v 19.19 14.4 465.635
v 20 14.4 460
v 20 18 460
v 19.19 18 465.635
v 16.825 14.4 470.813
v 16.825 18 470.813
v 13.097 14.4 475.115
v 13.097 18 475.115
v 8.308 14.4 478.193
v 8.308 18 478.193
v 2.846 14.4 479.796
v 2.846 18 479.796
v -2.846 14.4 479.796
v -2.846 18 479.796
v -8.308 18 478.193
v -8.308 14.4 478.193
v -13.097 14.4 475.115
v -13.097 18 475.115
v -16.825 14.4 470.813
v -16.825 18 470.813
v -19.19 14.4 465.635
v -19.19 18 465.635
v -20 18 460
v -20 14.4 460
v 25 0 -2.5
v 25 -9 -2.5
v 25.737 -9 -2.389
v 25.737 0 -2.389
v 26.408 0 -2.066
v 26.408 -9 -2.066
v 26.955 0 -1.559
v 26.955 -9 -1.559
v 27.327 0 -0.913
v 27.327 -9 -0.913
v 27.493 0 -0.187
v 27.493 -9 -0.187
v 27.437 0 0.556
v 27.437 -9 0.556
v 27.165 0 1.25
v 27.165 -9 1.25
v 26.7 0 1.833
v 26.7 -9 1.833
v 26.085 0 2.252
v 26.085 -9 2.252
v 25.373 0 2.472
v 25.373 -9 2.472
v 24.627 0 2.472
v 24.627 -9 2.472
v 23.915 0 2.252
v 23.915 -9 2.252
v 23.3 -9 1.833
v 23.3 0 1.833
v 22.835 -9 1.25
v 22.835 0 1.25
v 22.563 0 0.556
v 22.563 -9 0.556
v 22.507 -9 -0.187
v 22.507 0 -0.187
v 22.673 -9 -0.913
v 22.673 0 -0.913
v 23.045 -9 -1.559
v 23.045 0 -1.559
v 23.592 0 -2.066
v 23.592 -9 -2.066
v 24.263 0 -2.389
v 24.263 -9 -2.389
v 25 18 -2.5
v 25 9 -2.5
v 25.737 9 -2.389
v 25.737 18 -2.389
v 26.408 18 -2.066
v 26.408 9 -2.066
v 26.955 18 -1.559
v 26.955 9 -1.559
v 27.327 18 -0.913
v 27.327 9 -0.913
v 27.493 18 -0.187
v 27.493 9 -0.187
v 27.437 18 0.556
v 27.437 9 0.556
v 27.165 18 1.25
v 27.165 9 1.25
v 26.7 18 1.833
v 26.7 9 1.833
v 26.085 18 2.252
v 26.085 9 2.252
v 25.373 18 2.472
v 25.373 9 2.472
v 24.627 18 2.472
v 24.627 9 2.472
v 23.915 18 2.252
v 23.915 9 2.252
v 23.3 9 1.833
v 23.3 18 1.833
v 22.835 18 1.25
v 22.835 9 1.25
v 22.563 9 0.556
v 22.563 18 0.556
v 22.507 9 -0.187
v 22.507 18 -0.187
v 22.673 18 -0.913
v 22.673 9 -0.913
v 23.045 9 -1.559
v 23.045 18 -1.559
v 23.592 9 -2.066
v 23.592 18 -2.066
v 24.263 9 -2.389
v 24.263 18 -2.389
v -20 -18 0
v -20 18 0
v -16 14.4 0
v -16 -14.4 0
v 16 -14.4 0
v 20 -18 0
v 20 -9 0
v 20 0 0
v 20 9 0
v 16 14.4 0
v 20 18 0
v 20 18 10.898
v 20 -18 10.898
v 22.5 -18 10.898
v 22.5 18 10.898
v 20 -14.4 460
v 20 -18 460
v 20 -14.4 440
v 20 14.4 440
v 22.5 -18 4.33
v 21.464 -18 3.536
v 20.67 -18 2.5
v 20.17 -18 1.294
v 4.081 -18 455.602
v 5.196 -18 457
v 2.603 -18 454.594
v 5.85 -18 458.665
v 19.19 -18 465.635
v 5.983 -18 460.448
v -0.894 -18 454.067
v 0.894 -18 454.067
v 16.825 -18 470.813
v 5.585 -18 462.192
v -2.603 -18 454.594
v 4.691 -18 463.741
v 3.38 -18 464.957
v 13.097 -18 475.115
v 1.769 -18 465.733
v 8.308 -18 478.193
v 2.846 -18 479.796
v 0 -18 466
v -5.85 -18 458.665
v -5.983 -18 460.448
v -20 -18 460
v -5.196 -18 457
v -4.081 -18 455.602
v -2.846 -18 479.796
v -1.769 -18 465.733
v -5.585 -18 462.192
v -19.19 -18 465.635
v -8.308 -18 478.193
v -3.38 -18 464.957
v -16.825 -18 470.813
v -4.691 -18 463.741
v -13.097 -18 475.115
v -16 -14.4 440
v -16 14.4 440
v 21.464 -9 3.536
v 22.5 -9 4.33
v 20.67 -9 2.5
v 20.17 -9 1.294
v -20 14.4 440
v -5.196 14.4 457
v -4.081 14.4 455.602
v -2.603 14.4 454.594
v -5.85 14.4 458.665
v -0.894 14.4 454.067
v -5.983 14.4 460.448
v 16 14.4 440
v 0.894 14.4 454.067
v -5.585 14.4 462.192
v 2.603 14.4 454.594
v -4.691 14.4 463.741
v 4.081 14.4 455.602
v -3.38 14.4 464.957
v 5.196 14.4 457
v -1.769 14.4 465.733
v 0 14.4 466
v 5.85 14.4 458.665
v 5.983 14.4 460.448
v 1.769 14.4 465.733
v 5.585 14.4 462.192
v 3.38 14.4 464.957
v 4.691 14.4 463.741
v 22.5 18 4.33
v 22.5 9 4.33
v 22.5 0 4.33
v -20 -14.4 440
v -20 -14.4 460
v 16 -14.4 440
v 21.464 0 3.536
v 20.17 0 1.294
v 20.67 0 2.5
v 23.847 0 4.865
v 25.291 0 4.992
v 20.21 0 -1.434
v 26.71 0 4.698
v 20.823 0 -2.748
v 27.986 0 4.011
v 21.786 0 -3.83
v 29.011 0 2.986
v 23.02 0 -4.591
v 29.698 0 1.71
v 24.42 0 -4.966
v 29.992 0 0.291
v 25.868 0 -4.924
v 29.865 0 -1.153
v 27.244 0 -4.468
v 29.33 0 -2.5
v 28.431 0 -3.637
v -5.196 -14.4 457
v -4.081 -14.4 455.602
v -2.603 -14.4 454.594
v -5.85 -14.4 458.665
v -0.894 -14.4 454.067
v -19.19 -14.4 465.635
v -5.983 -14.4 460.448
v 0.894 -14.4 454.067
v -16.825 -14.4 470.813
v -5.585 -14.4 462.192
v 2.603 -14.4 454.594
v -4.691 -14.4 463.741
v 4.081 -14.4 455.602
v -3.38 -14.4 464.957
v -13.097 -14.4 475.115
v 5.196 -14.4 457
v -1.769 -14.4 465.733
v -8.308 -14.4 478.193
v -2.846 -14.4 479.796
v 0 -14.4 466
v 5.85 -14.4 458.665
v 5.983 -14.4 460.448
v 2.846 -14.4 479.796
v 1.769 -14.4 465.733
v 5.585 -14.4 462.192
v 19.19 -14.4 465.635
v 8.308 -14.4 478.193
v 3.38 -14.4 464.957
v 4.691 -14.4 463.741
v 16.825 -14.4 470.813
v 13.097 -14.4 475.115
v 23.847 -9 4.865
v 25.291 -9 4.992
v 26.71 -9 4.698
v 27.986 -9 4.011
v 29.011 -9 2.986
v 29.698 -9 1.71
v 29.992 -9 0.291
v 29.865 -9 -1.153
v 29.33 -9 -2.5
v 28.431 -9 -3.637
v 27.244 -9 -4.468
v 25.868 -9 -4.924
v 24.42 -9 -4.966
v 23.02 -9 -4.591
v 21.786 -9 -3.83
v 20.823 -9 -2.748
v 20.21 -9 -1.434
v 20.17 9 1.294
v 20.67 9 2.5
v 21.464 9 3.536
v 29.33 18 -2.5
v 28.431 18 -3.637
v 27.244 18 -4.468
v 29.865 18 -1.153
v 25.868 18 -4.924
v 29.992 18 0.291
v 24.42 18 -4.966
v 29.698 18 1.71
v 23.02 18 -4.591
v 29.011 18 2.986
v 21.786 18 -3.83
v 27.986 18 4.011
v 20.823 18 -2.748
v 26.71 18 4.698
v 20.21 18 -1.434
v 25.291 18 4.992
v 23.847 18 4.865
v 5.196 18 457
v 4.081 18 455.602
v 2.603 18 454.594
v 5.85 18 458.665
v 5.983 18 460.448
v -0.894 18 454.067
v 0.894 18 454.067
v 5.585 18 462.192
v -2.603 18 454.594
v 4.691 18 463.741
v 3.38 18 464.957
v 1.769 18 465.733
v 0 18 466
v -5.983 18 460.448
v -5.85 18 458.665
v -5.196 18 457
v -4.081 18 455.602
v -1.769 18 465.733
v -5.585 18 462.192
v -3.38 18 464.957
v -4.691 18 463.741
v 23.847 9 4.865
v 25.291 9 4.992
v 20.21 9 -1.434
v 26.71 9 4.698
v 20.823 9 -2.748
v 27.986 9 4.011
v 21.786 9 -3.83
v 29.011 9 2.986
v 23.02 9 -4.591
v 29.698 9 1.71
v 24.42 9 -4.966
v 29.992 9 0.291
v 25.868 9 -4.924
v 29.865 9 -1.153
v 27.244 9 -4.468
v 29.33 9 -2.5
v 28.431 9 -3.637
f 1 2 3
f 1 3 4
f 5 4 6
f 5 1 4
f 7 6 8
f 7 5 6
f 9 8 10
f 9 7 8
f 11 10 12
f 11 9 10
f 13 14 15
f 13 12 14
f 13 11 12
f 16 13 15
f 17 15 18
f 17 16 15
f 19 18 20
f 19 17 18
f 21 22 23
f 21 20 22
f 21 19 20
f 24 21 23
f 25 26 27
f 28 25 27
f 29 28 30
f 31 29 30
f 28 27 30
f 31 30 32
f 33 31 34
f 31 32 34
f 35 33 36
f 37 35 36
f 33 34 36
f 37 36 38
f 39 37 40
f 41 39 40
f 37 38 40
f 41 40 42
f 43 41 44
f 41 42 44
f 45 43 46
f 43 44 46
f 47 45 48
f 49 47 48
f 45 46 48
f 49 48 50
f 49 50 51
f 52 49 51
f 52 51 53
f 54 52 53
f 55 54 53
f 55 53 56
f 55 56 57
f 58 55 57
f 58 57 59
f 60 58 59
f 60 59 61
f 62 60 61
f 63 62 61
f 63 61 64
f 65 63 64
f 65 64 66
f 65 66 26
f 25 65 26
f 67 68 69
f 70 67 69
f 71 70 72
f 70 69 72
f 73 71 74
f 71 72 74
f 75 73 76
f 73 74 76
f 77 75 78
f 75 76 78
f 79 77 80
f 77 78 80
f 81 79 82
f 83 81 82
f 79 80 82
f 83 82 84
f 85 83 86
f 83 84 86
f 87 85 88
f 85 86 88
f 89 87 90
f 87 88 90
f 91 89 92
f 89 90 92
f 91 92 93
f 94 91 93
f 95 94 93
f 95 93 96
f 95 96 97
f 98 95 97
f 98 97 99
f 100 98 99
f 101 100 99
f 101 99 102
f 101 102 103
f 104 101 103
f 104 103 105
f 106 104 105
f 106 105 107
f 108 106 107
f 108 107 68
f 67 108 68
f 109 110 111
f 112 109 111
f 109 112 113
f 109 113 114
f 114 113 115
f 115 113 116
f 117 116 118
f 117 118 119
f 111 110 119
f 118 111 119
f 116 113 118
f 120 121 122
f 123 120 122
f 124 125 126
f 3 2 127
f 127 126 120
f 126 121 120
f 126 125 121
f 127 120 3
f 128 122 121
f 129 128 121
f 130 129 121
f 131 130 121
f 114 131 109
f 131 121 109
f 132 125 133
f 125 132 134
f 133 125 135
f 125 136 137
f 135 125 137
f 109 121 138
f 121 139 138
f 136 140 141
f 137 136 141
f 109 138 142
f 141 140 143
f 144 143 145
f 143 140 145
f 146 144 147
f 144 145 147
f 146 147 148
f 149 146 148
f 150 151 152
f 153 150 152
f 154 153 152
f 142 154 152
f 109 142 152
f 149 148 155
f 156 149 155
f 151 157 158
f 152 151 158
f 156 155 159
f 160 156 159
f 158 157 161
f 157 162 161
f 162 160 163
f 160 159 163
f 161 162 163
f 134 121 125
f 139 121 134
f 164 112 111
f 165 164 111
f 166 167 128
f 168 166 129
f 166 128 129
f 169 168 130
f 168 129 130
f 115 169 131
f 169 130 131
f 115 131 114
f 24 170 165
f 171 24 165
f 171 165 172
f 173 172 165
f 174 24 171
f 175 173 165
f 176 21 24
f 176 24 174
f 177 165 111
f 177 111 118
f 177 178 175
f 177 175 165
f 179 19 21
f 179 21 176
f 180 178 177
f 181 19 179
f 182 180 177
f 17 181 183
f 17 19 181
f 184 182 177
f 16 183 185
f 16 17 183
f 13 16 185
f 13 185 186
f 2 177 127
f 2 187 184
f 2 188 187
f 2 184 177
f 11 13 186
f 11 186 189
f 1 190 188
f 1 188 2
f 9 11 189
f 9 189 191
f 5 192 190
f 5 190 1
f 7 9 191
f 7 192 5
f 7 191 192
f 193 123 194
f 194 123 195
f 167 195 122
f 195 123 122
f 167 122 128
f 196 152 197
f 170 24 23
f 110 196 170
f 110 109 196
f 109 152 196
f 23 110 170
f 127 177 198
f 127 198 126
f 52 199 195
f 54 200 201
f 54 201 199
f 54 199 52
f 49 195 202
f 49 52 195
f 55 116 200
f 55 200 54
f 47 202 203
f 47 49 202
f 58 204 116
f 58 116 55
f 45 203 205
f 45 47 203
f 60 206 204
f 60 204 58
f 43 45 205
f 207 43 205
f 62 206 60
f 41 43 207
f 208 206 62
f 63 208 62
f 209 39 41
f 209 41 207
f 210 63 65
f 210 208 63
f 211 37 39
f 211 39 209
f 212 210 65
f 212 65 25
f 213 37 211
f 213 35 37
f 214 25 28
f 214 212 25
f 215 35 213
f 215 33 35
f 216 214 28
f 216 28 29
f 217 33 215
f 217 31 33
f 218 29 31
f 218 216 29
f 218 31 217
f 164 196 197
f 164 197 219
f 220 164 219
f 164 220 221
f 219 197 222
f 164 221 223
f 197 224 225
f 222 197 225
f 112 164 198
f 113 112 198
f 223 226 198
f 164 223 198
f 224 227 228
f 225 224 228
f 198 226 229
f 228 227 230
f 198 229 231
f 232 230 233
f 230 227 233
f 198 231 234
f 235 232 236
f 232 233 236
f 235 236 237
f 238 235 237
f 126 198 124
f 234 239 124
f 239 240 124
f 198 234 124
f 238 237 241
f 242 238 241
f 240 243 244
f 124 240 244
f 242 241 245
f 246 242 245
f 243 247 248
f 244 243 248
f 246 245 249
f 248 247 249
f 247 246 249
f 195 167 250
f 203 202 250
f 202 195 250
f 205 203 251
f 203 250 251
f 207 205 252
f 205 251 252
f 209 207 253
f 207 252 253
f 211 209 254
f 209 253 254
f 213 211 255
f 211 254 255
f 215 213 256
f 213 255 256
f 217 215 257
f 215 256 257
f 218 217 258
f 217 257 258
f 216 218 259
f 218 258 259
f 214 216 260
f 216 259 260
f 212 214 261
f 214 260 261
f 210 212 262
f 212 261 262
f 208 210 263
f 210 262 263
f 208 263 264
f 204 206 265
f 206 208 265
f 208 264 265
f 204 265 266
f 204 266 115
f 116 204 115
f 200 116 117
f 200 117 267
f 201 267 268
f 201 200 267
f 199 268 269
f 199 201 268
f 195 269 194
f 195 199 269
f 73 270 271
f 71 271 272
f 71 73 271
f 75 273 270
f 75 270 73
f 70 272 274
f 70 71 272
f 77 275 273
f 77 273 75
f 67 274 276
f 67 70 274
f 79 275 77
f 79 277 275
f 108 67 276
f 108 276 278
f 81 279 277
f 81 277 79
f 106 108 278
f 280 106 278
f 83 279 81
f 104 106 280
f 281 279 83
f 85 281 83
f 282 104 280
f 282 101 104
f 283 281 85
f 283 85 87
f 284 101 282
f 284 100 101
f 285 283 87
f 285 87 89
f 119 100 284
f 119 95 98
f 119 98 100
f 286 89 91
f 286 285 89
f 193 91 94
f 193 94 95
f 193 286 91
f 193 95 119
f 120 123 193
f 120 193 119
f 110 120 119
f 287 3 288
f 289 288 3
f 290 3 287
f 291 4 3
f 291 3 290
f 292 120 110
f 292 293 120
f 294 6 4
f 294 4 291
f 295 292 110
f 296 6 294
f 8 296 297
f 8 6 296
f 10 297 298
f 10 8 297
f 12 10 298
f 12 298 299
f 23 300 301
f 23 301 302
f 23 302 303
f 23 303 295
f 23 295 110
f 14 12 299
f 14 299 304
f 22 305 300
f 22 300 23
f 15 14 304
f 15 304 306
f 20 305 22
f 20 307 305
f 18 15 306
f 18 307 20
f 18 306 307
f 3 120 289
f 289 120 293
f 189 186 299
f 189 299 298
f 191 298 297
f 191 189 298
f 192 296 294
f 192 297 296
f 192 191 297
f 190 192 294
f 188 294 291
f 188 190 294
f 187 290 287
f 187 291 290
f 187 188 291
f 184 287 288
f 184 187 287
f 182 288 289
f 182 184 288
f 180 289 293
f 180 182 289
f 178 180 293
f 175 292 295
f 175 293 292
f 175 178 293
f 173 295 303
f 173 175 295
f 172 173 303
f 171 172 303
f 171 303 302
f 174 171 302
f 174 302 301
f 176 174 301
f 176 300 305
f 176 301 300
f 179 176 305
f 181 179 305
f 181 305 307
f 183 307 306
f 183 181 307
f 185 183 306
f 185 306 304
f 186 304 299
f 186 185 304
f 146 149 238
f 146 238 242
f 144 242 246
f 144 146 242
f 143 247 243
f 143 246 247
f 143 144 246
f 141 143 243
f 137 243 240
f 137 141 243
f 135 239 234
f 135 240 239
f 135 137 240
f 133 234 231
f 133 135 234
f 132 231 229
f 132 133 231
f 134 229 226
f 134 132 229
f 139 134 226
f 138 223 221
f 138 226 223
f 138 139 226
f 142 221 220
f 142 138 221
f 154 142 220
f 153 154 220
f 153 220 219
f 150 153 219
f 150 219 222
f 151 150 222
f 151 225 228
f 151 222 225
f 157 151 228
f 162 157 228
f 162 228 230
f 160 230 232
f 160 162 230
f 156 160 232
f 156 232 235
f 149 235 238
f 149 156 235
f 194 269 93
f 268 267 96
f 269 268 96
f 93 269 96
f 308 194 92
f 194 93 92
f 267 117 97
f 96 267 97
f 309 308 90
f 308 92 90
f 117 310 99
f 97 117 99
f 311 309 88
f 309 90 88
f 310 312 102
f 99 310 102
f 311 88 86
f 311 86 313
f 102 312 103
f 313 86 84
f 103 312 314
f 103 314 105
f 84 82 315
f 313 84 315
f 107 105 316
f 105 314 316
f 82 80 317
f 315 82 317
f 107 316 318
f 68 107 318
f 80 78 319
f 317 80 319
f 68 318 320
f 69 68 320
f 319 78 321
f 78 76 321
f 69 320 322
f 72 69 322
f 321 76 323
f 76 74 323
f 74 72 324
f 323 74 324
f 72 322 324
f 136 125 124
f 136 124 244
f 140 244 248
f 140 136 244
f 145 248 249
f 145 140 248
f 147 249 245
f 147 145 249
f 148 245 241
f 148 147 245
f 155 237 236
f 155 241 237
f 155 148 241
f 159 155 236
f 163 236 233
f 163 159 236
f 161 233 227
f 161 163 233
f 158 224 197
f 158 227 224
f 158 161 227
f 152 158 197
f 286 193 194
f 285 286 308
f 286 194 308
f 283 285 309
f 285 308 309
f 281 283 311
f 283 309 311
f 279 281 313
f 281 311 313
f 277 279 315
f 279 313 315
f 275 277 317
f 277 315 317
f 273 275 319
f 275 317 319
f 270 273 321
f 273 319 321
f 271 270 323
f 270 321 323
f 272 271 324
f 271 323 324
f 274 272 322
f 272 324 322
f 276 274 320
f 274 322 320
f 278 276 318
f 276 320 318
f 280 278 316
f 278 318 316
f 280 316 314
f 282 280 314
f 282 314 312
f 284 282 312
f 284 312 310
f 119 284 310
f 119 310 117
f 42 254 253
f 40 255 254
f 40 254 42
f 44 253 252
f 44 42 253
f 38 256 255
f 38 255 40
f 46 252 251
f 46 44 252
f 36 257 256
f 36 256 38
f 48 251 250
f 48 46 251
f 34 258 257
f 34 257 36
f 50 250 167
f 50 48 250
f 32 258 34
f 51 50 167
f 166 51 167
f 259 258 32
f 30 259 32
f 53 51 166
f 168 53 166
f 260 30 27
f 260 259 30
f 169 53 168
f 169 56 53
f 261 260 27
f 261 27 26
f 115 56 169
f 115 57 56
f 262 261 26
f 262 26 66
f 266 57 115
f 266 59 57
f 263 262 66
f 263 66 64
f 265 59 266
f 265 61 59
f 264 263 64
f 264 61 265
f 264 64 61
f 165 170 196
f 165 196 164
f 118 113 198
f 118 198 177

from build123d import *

# Parameters (mm, degrees)
SKETCH1_W               = 40
SKETCH1_H               = 36
SKETCH1_W_2             = 32
SKETCH1_H_2             = 28.8
BOSS_EXTRUDE1_DEPTH     = 480
SKETCH2_W               = 50
SKETCH2_H               = 28.8
CUT_EXTRUDE1_DEPTH      = 40
FILLET2_RADIUS          = 20
FILLET2_LENGTH          = 3.6
FILLET3_RADIUS          = 20
FILLET3_LENGTH          = 3.6
CUT_EXTRUDE2_DEPTH      = 482.763427421
CUT_EXTRUDE2_DEPTH_BACK = 482.763427421
SKETCH3_R               = 6
SKETCH4_R               = 2.5
BOSS_EXTRUDE2_DEPTH     = 36
CUT_EXTRUDE3_START      = 9
SKETCH5_R               = 5
CUT_EXTRUDE3_DEPTH      = 9
CUT_EXTRUDE4_START      = -9
SKETCH7_R               = 5
CUT_EXTRUDE4_DEPTH      = 9


with BuildPart() as part:
    # Sketch1 → Boss-Extrude1 (new body)
    with BuildSketch(Plane.XY):
        Rectangle(SKETCH1_W, SKETCH1_H)
        Rectangle(SKETCH1_W_2, SKETCH1_H_2, mode=Mode.SUBTRACT)
    extrude(amount=BOSS_EXTRUDE1_DEPTH)

    # Sketch2 → Cut-Extrude1 (cut)
    with BuildSketch(Plane.XY.offset(480)):
        Rectangle(SKETCH2_W, SKETCH2_H)
    extrude(amount=-CUT_EXTRUDE1_DEPTH, mode=Mode.SUBTRACT)

    # Fillet2: full round fillet: the end face becomes a half cylinder, R = half its width
    fillet2_face = Plane((0, -16.2, 480), x_dir=(0, -1, 0), z_dir=(0, 0, 1))  # on the end face: x along it, z out of the body
    fillet2_slab = fillet2_face.offset(-FILLET2_RADIUS / 2) * Box(FILLET2_LENGTH, 2 * FILLET2_RADIUS, FILLET2_RADIUS, mode=Mode.PRIVATE)  # the body's end, R deep
    fillet2_round = Plane((0, -16.2, 460), x_dir=(0, 0, 1), z_dir=(0, -1, 0)) * Cylinder(FILLET2_RADIUS, FILLET2_LENGTH, mode=Mode.PRIVATE)  # its axis R under the face
    add(fillet2_slab - fillet2_round, mode=Mode.SUBTRACT)

    # Fillet3: full round fillet: the end face becomes a half cylinder, R = half its width
    fillet3_face = Plane((0, 16.2, 480), x_dir=(0, -1, 0), z_dir=(0, 0, 1))  # on the end face: x along it, z out of the body
    fillet3_slab = fillet3_face.offset(-FILLET3_RADIUS / 2) * Box(FILLET3_LENGTH, 2 * FILLET3_RADIUS, FILLET3_RADIUS, mode=Mode.PRIVATE)  # the body's end, R deep
    fillet3_round = Plane((0, 16.2, 460), x_dir=(0, 0, 1), z_dir=(0, -1, 0)) * Cylinder(FILLET3_RADIUS, FILLET3_LENGTH, mode=Mode.PRIVATE)  # its axis R under the face
    add(fillet3_slab - fillet3_round, mode=Mode.SUBTRACT)

    # Sketch3 → Cut-Extrude2 (cut, two sides: drawn at the far end of the back side and taken through both)
    with BuildSketch(Plane(origin=(0, 18, 0), x_dir=(1, 0, 0), z_dir=(0, 1, 0)).offset(-CUT_EXTRUDE2_DEPTH_BACK)):
        with Locations(Location((0, -460, 0), (0, 0, 270))):
            Circle(SKETCH3_R)
    extrude(amount=CUT_EXTRUDE2_DEPTH + CUT_EXTRUDE2_DEPTH_BACK, mode=Mode.SUBTRACT)

    # Sketch4 → Boss-Extrude2 (add)
    with BuildSketch(Plane.XZ.offset(18)):
        with BuildLine():
            Line((20, 0), (20, 10.898129461))
            Line((20, 10.898129461), (22.5, 10.898129461))
            Line((22.5, 10.898129461), (22.5, 4.330127019))
            ThreePointArc((22.5, 4.330127019), (29.330127019, -2.5), (20, 0))
        make_face()
        with Locations(Location((25, 0, 0), (0, 0, 270))):
            Circle(SKETCH4_R, mode=Mode.SUBTRACT)
    extrude(amount=-BOSS_EXTRUDE2_DEPTH)

    # Sketch5 → Cut-Extrude3 (cut)
    with BuildSketch(Plane(origin=(0, -9, 0), x_dir=(-1, 0, 0), z_dir=(0, -1, 0)).offset(CUT_EXTRUDE3_START)):
        with Locations((-25, 0)):
            Circle(SKETCH5_R)
    extrude(amount=-CUT_EXTRUDE3_DEPTH, mode=Mode.SUBTRACT)

    # Sketch7 → Cut-Extrude4 (cut)
    with BuildSketch(Plane(origin=(0, 9, 0), x_dir=(1, 0, 0), z_dir=(0, 1, 0)).offset(CUT_EXTRUDE4_START)):
        with Locations((25, 0)):
            Circle(SKETCH7_R)
    extrude(amount=CUT_EXTRUDE4_DEPTH, mode=Mode.SUBTRACT)


solid = part.part
